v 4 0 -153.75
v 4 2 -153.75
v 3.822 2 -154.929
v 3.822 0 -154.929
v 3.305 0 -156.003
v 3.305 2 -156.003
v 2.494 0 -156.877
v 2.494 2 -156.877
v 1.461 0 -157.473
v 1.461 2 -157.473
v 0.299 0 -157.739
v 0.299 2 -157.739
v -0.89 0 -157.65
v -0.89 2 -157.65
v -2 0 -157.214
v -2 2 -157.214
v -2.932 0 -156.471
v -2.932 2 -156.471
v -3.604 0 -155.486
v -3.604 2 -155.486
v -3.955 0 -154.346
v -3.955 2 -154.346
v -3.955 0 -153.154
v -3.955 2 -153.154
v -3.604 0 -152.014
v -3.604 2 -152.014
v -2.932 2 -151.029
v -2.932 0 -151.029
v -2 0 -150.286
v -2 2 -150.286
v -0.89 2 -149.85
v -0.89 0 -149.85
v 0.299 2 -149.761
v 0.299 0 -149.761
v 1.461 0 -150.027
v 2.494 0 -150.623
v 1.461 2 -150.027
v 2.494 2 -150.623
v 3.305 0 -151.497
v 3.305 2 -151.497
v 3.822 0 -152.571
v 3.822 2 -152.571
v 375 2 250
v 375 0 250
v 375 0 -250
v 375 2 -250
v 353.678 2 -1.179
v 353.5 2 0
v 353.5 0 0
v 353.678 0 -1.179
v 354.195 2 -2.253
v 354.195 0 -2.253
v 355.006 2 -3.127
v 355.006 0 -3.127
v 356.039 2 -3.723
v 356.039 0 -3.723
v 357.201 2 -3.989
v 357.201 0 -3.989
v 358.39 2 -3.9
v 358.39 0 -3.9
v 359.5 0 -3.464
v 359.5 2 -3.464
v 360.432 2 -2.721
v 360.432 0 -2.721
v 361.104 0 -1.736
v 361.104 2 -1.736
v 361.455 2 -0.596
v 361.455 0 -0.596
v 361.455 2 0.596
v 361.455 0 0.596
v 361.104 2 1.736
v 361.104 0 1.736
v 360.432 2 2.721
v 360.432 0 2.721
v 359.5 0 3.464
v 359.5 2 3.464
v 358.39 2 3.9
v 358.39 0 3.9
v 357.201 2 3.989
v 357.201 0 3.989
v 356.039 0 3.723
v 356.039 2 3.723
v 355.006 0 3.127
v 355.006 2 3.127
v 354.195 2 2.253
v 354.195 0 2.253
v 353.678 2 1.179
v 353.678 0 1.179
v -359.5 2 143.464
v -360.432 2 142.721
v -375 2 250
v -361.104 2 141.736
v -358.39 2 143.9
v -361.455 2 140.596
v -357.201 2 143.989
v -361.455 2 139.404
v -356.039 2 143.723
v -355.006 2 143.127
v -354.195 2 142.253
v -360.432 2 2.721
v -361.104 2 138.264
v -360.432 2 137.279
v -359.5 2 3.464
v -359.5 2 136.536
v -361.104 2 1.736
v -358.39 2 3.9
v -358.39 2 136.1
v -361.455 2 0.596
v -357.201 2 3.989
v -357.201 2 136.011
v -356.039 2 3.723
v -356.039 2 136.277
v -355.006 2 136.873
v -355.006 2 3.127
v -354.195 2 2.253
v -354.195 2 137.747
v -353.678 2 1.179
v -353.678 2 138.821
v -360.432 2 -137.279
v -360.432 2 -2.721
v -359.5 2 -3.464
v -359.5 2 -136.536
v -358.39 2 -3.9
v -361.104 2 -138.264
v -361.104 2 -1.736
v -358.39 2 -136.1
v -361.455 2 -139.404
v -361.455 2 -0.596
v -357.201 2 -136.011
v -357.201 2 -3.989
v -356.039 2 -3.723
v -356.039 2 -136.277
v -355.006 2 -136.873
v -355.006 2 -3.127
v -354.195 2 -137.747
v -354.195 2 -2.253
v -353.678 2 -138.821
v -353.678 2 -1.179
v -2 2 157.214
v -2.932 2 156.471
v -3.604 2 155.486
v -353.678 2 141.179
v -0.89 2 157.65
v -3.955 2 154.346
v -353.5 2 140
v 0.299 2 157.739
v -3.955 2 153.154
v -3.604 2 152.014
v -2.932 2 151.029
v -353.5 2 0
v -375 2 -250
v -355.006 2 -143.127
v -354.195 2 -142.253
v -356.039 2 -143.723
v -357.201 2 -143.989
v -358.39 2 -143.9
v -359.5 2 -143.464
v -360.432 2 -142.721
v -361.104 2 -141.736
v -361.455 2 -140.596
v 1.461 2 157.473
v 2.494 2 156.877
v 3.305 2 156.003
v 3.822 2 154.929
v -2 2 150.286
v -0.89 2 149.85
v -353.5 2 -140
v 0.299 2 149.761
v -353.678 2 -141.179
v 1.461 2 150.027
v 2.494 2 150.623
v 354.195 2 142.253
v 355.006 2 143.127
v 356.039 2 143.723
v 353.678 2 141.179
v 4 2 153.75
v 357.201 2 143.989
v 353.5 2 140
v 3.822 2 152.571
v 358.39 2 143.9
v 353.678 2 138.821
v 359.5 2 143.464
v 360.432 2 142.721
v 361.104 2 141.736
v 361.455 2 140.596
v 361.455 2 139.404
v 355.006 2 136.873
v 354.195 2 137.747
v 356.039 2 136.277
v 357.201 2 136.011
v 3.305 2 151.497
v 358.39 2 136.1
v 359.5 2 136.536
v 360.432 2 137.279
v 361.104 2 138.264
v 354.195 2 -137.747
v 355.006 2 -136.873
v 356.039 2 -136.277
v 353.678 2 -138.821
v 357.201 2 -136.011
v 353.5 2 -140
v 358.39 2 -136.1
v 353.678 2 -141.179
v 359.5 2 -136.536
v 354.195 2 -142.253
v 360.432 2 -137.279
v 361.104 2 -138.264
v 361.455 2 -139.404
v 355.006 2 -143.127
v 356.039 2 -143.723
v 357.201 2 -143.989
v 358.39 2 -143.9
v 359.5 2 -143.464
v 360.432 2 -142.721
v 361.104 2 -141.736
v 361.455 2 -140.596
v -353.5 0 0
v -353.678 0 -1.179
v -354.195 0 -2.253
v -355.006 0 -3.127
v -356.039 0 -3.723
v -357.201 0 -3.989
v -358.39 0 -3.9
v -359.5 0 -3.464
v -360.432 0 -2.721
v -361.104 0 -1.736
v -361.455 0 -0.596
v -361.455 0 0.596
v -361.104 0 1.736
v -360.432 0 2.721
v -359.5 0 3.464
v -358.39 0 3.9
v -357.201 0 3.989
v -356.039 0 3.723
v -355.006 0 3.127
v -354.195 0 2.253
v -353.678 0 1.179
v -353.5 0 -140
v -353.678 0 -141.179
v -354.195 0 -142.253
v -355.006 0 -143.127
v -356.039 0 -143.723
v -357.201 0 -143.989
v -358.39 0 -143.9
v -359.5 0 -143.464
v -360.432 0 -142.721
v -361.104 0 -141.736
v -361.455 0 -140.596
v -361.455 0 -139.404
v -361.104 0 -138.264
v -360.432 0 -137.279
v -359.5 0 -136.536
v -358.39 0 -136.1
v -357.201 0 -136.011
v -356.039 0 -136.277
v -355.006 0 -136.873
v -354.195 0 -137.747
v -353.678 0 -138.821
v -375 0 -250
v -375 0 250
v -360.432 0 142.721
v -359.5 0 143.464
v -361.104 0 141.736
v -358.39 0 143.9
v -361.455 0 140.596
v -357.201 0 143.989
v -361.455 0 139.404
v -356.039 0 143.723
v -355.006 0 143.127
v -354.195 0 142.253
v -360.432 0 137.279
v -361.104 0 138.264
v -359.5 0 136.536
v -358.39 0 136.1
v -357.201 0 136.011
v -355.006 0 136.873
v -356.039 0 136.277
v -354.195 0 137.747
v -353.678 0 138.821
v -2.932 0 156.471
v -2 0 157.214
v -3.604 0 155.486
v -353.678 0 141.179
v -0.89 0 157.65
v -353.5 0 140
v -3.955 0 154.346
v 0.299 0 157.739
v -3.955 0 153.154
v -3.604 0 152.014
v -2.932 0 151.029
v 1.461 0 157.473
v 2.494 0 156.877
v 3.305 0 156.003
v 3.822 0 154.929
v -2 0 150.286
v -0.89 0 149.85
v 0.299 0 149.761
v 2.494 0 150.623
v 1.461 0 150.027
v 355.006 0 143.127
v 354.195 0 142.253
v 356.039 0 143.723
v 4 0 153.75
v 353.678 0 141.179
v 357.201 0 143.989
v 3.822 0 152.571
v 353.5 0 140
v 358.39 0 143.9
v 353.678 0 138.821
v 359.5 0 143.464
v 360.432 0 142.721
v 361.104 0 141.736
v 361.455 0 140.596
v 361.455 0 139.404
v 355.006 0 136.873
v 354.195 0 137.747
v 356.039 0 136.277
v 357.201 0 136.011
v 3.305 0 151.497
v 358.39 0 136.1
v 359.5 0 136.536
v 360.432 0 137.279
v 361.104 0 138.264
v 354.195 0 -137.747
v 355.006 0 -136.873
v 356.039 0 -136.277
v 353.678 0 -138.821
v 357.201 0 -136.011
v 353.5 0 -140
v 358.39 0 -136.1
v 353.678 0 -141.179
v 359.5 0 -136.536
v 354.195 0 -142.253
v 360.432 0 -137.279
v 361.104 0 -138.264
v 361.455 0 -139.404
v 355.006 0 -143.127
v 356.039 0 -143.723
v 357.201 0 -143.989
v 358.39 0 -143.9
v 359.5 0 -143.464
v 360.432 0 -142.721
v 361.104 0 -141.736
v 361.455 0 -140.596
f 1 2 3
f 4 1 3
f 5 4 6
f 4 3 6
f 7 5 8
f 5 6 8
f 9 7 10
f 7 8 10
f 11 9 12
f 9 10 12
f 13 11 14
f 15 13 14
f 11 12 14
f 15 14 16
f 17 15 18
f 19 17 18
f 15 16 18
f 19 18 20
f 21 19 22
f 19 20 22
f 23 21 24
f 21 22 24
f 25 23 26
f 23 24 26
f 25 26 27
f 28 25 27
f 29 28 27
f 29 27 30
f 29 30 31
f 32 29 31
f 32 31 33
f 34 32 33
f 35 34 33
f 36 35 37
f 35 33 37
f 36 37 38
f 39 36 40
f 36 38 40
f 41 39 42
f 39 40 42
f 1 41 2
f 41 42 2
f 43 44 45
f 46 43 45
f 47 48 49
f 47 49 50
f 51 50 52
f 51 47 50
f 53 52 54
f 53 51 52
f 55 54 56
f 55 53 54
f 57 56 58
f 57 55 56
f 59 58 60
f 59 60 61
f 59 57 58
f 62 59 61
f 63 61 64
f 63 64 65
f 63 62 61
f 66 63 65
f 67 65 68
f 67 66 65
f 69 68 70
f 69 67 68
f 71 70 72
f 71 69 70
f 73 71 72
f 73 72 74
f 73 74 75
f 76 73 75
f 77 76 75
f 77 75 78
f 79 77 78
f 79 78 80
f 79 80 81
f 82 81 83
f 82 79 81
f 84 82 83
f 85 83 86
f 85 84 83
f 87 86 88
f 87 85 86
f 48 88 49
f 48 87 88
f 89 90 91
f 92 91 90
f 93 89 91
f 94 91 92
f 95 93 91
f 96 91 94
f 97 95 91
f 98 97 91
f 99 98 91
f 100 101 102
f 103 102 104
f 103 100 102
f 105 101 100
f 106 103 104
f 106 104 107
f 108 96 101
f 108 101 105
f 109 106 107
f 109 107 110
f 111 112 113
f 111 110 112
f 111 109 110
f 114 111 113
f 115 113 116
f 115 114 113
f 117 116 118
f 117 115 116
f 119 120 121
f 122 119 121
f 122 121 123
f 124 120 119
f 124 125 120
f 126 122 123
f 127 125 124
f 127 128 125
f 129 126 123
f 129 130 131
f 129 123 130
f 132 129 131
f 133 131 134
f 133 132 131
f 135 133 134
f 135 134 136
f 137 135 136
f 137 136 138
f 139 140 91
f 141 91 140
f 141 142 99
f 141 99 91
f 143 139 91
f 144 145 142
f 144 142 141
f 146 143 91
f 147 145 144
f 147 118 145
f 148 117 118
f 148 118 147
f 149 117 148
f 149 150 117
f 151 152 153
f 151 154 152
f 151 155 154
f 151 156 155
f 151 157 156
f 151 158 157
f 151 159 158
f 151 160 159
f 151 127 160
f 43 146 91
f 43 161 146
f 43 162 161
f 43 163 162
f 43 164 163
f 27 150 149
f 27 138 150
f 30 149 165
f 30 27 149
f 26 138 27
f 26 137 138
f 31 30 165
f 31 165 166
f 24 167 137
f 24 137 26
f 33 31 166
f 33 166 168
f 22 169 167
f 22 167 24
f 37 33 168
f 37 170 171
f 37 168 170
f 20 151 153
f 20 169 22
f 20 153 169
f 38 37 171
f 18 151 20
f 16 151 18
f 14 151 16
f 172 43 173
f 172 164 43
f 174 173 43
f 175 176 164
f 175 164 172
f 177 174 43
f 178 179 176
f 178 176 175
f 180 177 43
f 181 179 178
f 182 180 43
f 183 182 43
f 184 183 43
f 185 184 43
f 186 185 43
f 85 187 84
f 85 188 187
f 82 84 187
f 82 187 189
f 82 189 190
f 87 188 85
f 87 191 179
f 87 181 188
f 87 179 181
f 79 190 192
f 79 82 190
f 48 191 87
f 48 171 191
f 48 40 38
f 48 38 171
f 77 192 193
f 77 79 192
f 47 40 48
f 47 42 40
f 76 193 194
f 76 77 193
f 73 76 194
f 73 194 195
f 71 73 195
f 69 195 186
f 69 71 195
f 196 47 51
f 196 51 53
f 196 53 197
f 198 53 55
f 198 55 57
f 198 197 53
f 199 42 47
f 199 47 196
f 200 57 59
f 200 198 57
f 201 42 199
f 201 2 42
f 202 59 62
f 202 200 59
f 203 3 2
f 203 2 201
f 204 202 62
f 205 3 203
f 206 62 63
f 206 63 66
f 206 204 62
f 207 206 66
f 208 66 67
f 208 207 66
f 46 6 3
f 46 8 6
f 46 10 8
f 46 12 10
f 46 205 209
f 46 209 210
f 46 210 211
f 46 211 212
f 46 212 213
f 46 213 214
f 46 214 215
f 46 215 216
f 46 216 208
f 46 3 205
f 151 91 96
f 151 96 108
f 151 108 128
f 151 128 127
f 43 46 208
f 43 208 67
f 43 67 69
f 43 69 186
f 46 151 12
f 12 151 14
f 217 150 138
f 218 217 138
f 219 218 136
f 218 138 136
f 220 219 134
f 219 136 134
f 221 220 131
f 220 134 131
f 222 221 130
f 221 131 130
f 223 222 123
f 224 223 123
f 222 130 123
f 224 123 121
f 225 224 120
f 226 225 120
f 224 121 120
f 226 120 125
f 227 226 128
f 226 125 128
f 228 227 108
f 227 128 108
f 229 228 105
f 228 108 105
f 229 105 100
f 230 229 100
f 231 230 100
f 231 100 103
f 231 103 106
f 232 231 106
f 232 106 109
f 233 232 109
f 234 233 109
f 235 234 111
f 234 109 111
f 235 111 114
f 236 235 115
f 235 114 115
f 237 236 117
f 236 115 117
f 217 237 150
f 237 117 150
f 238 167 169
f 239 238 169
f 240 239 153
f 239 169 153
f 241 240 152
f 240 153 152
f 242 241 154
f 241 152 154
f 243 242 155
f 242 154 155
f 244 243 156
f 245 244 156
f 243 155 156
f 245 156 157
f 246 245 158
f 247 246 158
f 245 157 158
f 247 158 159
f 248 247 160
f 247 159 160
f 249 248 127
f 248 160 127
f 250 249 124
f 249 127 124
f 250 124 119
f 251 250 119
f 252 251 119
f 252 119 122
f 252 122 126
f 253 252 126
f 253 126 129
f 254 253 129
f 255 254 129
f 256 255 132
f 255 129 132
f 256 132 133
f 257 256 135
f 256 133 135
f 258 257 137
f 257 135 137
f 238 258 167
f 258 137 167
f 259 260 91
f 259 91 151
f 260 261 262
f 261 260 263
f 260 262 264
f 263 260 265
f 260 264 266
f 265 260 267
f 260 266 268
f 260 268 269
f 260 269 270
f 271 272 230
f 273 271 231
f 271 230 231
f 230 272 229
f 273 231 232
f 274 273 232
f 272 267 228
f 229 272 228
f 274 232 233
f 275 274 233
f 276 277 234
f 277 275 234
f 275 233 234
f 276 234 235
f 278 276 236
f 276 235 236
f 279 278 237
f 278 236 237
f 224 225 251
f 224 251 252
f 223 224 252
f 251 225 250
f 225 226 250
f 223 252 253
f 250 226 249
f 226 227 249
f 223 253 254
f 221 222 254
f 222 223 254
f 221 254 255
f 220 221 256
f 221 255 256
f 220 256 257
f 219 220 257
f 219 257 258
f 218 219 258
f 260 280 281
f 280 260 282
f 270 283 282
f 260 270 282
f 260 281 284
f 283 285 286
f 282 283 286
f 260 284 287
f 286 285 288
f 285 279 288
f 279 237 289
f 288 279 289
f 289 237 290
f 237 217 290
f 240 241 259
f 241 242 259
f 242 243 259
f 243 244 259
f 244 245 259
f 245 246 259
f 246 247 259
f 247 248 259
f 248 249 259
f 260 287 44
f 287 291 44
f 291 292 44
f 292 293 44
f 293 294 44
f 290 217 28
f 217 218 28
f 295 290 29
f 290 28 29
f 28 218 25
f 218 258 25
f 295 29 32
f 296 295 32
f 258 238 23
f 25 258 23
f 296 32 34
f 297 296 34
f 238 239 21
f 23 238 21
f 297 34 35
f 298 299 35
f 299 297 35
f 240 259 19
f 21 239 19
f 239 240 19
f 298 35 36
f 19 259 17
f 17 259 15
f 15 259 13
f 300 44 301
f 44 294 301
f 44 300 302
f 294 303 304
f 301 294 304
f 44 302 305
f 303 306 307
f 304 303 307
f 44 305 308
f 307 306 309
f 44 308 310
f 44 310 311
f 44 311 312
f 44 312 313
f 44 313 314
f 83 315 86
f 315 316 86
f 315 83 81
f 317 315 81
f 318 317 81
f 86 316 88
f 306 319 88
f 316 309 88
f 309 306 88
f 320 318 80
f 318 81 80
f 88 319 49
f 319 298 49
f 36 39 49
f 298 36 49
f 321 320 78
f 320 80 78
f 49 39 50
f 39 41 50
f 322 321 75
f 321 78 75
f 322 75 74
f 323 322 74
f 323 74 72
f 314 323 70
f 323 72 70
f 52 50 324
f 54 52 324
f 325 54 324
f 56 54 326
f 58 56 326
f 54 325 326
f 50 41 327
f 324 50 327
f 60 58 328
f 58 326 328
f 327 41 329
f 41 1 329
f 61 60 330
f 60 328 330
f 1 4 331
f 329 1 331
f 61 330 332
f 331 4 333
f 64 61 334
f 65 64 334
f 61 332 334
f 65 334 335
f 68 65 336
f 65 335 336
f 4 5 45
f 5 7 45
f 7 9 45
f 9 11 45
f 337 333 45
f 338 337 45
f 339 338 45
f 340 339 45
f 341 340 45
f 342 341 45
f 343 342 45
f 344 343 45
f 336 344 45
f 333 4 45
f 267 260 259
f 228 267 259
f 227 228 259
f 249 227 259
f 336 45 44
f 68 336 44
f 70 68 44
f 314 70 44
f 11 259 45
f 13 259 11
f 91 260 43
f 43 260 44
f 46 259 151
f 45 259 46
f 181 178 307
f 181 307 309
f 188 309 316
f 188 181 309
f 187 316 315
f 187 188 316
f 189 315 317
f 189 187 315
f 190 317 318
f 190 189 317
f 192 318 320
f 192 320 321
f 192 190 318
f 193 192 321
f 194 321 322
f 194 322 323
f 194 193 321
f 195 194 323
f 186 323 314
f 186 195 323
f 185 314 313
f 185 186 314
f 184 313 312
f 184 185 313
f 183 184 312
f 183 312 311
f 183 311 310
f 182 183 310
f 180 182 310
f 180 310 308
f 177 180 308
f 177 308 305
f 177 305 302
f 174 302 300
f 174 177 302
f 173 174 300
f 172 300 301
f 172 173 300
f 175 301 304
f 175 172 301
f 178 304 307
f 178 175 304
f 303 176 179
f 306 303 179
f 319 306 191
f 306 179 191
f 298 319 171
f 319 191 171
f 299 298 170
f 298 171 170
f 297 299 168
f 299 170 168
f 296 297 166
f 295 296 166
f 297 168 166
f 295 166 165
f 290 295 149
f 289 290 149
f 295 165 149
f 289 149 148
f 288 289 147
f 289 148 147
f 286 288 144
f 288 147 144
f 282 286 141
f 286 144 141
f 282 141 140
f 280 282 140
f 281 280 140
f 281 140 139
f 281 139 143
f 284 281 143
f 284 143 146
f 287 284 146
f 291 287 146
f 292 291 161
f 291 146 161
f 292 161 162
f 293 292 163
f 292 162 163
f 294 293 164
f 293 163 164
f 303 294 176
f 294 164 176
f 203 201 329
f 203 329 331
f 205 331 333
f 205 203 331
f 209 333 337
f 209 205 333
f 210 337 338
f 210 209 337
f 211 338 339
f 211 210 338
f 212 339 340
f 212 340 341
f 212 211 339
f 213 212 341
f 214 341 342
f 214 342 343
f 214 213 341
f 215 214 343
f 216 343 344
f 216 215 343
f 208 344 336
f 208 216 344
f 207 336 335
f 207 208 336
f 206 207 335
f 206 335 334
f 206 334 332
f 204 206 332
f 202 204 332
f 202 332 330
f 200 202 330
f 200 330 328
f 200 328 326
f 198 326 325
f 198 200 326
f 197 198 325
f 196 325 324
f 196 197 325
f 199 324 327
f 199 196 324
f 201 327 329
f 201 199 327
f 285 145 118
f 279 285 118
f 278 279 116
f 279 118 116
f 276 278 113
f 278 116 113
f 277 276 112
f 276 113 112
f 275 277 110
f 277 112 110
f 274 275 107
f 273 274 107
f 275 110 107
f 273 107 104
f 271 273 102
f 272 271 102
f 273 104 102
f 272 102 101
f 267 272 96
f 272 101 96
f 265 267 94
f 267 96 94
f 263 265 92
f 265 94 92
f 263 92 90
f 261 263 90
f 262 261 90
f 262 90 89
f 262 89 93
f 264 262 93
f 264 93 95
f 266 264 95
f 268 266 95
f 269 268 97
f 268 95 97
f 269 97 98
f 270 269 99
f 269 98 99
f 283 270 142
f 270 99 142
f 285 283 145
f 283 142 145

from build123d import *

# Parameters (mm, degrees)
SKETCH1_W           = 750
SKETCH1_H           = 500
BOSS_EXTRUDE1_DEPTH = 2
SKETCH2_R           = 4
CUT_EXTRUDE1_DEPTH  = 2
SKETCH3_R           = 4
CUT_EXTRUDE2_DEPTH  = 2


with BuildPart() as part:
    # Sketch1 → Boss-Extrude1 (new body)
    with BuildSketch(Plane(origin=(0, 0, 0), x_dir=(1, 0, 0), z_dir=(0, 1, 0))):
        Rectangle(SKETCH1_W, SKETCH1_H)
    extrude(amount=BOSS_EXTRUDE1_DEPTH)

    # Sketch2 → Cut-Extrude1 (cut)
    with BuildSketch(Plane(origin=(0, 2, 0), x_dir=(1, 0, 0), z_dir=(0, 1, 0))):
        with Locations((-357.5, 0)):
            Circle(SKETCH2_R)
        with Locations((-357.5, 140)):
            Circle(SKETCH2_R)
        with Locations((-357.5, -140)):
            Circle(SKETCH2_R)
    cut_extrude1 = extrude(amount=-CUT_EXTRUDE1_DEPTH, mode=Mode.SUBTRACT)

    # Mirror1: Cut-Extrude1 across plane
    add(cut_extrude1.mirror(Plane(origin=(0, 0, 0), x_dir=(0, 0, 1), z_dir=(1, 0, 0))), mode=Mode.SUBTRACT)

    # Sketch3 → Cut-Extrude2 (cut)
    with BuildSketch(Plane(origin=(0, 2, 0), x_dir=(1, 0, 0), z_dir=(0, 1, 0))):
        with Locations((0, 153.75)):
            Circle(SKETCH3_R)
        with Locations((0, -153.75)):
            Circle(SKETCH3_R)
    extrude(amount=-CUT_EXTRUDE2_DEPTH, mode=Mode.SUBTRACT)


solid = part.part
